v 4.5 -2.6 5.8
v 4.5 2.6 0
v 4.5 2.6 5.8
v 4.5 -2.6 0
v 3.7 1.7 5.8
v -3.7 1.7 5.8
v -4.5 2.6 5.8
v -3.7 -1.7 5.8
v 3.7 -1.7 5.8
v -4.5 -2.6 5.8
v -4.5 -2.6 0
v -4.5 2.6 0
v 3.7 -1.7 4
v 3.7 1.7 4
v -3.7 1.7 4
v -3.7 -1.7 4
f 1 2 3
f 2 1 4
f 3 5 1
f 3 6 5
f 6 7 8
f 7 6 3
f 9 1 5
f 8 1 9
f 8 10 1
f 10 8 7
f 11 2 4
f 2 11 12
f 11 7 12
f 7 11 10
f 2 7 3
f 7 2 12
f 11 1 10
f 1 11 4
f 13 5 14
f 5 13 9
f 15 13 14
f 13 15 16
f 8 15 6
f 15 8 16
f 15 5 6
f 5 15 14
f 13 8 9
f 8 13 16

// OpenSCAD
// Mechanical first-article envelope for a vertical 16-pin USB-C receptacle.
// The purchased connector remains the electrical source of truth; this model
// keeps the panel-side opening and board-to-panel clearance reviewable until
// the exact vendor STEP is frozen.
$fn = 48;

body_w = 9.0;
body_d = 5.2;
body_h = 5.8;
mouth_w = 7.4;
mouth_d = 3.4;
mouth_depth = 1.8;

difference() {
    translate([-body_w / 2, -body_d / 2, 0])
        cube([body_w, body_d, body_h]);
    // The mating opening faces local +z, which becomes the y+ service face
    // after the UI PCB is installed vertically in the enclosure.
    translate([-mouth_w / 2, -mouth_d / 2, body_h - mouth_depth])
        cube([mouth_w, mouth_d, mouth_depth + 0.2]);
}
